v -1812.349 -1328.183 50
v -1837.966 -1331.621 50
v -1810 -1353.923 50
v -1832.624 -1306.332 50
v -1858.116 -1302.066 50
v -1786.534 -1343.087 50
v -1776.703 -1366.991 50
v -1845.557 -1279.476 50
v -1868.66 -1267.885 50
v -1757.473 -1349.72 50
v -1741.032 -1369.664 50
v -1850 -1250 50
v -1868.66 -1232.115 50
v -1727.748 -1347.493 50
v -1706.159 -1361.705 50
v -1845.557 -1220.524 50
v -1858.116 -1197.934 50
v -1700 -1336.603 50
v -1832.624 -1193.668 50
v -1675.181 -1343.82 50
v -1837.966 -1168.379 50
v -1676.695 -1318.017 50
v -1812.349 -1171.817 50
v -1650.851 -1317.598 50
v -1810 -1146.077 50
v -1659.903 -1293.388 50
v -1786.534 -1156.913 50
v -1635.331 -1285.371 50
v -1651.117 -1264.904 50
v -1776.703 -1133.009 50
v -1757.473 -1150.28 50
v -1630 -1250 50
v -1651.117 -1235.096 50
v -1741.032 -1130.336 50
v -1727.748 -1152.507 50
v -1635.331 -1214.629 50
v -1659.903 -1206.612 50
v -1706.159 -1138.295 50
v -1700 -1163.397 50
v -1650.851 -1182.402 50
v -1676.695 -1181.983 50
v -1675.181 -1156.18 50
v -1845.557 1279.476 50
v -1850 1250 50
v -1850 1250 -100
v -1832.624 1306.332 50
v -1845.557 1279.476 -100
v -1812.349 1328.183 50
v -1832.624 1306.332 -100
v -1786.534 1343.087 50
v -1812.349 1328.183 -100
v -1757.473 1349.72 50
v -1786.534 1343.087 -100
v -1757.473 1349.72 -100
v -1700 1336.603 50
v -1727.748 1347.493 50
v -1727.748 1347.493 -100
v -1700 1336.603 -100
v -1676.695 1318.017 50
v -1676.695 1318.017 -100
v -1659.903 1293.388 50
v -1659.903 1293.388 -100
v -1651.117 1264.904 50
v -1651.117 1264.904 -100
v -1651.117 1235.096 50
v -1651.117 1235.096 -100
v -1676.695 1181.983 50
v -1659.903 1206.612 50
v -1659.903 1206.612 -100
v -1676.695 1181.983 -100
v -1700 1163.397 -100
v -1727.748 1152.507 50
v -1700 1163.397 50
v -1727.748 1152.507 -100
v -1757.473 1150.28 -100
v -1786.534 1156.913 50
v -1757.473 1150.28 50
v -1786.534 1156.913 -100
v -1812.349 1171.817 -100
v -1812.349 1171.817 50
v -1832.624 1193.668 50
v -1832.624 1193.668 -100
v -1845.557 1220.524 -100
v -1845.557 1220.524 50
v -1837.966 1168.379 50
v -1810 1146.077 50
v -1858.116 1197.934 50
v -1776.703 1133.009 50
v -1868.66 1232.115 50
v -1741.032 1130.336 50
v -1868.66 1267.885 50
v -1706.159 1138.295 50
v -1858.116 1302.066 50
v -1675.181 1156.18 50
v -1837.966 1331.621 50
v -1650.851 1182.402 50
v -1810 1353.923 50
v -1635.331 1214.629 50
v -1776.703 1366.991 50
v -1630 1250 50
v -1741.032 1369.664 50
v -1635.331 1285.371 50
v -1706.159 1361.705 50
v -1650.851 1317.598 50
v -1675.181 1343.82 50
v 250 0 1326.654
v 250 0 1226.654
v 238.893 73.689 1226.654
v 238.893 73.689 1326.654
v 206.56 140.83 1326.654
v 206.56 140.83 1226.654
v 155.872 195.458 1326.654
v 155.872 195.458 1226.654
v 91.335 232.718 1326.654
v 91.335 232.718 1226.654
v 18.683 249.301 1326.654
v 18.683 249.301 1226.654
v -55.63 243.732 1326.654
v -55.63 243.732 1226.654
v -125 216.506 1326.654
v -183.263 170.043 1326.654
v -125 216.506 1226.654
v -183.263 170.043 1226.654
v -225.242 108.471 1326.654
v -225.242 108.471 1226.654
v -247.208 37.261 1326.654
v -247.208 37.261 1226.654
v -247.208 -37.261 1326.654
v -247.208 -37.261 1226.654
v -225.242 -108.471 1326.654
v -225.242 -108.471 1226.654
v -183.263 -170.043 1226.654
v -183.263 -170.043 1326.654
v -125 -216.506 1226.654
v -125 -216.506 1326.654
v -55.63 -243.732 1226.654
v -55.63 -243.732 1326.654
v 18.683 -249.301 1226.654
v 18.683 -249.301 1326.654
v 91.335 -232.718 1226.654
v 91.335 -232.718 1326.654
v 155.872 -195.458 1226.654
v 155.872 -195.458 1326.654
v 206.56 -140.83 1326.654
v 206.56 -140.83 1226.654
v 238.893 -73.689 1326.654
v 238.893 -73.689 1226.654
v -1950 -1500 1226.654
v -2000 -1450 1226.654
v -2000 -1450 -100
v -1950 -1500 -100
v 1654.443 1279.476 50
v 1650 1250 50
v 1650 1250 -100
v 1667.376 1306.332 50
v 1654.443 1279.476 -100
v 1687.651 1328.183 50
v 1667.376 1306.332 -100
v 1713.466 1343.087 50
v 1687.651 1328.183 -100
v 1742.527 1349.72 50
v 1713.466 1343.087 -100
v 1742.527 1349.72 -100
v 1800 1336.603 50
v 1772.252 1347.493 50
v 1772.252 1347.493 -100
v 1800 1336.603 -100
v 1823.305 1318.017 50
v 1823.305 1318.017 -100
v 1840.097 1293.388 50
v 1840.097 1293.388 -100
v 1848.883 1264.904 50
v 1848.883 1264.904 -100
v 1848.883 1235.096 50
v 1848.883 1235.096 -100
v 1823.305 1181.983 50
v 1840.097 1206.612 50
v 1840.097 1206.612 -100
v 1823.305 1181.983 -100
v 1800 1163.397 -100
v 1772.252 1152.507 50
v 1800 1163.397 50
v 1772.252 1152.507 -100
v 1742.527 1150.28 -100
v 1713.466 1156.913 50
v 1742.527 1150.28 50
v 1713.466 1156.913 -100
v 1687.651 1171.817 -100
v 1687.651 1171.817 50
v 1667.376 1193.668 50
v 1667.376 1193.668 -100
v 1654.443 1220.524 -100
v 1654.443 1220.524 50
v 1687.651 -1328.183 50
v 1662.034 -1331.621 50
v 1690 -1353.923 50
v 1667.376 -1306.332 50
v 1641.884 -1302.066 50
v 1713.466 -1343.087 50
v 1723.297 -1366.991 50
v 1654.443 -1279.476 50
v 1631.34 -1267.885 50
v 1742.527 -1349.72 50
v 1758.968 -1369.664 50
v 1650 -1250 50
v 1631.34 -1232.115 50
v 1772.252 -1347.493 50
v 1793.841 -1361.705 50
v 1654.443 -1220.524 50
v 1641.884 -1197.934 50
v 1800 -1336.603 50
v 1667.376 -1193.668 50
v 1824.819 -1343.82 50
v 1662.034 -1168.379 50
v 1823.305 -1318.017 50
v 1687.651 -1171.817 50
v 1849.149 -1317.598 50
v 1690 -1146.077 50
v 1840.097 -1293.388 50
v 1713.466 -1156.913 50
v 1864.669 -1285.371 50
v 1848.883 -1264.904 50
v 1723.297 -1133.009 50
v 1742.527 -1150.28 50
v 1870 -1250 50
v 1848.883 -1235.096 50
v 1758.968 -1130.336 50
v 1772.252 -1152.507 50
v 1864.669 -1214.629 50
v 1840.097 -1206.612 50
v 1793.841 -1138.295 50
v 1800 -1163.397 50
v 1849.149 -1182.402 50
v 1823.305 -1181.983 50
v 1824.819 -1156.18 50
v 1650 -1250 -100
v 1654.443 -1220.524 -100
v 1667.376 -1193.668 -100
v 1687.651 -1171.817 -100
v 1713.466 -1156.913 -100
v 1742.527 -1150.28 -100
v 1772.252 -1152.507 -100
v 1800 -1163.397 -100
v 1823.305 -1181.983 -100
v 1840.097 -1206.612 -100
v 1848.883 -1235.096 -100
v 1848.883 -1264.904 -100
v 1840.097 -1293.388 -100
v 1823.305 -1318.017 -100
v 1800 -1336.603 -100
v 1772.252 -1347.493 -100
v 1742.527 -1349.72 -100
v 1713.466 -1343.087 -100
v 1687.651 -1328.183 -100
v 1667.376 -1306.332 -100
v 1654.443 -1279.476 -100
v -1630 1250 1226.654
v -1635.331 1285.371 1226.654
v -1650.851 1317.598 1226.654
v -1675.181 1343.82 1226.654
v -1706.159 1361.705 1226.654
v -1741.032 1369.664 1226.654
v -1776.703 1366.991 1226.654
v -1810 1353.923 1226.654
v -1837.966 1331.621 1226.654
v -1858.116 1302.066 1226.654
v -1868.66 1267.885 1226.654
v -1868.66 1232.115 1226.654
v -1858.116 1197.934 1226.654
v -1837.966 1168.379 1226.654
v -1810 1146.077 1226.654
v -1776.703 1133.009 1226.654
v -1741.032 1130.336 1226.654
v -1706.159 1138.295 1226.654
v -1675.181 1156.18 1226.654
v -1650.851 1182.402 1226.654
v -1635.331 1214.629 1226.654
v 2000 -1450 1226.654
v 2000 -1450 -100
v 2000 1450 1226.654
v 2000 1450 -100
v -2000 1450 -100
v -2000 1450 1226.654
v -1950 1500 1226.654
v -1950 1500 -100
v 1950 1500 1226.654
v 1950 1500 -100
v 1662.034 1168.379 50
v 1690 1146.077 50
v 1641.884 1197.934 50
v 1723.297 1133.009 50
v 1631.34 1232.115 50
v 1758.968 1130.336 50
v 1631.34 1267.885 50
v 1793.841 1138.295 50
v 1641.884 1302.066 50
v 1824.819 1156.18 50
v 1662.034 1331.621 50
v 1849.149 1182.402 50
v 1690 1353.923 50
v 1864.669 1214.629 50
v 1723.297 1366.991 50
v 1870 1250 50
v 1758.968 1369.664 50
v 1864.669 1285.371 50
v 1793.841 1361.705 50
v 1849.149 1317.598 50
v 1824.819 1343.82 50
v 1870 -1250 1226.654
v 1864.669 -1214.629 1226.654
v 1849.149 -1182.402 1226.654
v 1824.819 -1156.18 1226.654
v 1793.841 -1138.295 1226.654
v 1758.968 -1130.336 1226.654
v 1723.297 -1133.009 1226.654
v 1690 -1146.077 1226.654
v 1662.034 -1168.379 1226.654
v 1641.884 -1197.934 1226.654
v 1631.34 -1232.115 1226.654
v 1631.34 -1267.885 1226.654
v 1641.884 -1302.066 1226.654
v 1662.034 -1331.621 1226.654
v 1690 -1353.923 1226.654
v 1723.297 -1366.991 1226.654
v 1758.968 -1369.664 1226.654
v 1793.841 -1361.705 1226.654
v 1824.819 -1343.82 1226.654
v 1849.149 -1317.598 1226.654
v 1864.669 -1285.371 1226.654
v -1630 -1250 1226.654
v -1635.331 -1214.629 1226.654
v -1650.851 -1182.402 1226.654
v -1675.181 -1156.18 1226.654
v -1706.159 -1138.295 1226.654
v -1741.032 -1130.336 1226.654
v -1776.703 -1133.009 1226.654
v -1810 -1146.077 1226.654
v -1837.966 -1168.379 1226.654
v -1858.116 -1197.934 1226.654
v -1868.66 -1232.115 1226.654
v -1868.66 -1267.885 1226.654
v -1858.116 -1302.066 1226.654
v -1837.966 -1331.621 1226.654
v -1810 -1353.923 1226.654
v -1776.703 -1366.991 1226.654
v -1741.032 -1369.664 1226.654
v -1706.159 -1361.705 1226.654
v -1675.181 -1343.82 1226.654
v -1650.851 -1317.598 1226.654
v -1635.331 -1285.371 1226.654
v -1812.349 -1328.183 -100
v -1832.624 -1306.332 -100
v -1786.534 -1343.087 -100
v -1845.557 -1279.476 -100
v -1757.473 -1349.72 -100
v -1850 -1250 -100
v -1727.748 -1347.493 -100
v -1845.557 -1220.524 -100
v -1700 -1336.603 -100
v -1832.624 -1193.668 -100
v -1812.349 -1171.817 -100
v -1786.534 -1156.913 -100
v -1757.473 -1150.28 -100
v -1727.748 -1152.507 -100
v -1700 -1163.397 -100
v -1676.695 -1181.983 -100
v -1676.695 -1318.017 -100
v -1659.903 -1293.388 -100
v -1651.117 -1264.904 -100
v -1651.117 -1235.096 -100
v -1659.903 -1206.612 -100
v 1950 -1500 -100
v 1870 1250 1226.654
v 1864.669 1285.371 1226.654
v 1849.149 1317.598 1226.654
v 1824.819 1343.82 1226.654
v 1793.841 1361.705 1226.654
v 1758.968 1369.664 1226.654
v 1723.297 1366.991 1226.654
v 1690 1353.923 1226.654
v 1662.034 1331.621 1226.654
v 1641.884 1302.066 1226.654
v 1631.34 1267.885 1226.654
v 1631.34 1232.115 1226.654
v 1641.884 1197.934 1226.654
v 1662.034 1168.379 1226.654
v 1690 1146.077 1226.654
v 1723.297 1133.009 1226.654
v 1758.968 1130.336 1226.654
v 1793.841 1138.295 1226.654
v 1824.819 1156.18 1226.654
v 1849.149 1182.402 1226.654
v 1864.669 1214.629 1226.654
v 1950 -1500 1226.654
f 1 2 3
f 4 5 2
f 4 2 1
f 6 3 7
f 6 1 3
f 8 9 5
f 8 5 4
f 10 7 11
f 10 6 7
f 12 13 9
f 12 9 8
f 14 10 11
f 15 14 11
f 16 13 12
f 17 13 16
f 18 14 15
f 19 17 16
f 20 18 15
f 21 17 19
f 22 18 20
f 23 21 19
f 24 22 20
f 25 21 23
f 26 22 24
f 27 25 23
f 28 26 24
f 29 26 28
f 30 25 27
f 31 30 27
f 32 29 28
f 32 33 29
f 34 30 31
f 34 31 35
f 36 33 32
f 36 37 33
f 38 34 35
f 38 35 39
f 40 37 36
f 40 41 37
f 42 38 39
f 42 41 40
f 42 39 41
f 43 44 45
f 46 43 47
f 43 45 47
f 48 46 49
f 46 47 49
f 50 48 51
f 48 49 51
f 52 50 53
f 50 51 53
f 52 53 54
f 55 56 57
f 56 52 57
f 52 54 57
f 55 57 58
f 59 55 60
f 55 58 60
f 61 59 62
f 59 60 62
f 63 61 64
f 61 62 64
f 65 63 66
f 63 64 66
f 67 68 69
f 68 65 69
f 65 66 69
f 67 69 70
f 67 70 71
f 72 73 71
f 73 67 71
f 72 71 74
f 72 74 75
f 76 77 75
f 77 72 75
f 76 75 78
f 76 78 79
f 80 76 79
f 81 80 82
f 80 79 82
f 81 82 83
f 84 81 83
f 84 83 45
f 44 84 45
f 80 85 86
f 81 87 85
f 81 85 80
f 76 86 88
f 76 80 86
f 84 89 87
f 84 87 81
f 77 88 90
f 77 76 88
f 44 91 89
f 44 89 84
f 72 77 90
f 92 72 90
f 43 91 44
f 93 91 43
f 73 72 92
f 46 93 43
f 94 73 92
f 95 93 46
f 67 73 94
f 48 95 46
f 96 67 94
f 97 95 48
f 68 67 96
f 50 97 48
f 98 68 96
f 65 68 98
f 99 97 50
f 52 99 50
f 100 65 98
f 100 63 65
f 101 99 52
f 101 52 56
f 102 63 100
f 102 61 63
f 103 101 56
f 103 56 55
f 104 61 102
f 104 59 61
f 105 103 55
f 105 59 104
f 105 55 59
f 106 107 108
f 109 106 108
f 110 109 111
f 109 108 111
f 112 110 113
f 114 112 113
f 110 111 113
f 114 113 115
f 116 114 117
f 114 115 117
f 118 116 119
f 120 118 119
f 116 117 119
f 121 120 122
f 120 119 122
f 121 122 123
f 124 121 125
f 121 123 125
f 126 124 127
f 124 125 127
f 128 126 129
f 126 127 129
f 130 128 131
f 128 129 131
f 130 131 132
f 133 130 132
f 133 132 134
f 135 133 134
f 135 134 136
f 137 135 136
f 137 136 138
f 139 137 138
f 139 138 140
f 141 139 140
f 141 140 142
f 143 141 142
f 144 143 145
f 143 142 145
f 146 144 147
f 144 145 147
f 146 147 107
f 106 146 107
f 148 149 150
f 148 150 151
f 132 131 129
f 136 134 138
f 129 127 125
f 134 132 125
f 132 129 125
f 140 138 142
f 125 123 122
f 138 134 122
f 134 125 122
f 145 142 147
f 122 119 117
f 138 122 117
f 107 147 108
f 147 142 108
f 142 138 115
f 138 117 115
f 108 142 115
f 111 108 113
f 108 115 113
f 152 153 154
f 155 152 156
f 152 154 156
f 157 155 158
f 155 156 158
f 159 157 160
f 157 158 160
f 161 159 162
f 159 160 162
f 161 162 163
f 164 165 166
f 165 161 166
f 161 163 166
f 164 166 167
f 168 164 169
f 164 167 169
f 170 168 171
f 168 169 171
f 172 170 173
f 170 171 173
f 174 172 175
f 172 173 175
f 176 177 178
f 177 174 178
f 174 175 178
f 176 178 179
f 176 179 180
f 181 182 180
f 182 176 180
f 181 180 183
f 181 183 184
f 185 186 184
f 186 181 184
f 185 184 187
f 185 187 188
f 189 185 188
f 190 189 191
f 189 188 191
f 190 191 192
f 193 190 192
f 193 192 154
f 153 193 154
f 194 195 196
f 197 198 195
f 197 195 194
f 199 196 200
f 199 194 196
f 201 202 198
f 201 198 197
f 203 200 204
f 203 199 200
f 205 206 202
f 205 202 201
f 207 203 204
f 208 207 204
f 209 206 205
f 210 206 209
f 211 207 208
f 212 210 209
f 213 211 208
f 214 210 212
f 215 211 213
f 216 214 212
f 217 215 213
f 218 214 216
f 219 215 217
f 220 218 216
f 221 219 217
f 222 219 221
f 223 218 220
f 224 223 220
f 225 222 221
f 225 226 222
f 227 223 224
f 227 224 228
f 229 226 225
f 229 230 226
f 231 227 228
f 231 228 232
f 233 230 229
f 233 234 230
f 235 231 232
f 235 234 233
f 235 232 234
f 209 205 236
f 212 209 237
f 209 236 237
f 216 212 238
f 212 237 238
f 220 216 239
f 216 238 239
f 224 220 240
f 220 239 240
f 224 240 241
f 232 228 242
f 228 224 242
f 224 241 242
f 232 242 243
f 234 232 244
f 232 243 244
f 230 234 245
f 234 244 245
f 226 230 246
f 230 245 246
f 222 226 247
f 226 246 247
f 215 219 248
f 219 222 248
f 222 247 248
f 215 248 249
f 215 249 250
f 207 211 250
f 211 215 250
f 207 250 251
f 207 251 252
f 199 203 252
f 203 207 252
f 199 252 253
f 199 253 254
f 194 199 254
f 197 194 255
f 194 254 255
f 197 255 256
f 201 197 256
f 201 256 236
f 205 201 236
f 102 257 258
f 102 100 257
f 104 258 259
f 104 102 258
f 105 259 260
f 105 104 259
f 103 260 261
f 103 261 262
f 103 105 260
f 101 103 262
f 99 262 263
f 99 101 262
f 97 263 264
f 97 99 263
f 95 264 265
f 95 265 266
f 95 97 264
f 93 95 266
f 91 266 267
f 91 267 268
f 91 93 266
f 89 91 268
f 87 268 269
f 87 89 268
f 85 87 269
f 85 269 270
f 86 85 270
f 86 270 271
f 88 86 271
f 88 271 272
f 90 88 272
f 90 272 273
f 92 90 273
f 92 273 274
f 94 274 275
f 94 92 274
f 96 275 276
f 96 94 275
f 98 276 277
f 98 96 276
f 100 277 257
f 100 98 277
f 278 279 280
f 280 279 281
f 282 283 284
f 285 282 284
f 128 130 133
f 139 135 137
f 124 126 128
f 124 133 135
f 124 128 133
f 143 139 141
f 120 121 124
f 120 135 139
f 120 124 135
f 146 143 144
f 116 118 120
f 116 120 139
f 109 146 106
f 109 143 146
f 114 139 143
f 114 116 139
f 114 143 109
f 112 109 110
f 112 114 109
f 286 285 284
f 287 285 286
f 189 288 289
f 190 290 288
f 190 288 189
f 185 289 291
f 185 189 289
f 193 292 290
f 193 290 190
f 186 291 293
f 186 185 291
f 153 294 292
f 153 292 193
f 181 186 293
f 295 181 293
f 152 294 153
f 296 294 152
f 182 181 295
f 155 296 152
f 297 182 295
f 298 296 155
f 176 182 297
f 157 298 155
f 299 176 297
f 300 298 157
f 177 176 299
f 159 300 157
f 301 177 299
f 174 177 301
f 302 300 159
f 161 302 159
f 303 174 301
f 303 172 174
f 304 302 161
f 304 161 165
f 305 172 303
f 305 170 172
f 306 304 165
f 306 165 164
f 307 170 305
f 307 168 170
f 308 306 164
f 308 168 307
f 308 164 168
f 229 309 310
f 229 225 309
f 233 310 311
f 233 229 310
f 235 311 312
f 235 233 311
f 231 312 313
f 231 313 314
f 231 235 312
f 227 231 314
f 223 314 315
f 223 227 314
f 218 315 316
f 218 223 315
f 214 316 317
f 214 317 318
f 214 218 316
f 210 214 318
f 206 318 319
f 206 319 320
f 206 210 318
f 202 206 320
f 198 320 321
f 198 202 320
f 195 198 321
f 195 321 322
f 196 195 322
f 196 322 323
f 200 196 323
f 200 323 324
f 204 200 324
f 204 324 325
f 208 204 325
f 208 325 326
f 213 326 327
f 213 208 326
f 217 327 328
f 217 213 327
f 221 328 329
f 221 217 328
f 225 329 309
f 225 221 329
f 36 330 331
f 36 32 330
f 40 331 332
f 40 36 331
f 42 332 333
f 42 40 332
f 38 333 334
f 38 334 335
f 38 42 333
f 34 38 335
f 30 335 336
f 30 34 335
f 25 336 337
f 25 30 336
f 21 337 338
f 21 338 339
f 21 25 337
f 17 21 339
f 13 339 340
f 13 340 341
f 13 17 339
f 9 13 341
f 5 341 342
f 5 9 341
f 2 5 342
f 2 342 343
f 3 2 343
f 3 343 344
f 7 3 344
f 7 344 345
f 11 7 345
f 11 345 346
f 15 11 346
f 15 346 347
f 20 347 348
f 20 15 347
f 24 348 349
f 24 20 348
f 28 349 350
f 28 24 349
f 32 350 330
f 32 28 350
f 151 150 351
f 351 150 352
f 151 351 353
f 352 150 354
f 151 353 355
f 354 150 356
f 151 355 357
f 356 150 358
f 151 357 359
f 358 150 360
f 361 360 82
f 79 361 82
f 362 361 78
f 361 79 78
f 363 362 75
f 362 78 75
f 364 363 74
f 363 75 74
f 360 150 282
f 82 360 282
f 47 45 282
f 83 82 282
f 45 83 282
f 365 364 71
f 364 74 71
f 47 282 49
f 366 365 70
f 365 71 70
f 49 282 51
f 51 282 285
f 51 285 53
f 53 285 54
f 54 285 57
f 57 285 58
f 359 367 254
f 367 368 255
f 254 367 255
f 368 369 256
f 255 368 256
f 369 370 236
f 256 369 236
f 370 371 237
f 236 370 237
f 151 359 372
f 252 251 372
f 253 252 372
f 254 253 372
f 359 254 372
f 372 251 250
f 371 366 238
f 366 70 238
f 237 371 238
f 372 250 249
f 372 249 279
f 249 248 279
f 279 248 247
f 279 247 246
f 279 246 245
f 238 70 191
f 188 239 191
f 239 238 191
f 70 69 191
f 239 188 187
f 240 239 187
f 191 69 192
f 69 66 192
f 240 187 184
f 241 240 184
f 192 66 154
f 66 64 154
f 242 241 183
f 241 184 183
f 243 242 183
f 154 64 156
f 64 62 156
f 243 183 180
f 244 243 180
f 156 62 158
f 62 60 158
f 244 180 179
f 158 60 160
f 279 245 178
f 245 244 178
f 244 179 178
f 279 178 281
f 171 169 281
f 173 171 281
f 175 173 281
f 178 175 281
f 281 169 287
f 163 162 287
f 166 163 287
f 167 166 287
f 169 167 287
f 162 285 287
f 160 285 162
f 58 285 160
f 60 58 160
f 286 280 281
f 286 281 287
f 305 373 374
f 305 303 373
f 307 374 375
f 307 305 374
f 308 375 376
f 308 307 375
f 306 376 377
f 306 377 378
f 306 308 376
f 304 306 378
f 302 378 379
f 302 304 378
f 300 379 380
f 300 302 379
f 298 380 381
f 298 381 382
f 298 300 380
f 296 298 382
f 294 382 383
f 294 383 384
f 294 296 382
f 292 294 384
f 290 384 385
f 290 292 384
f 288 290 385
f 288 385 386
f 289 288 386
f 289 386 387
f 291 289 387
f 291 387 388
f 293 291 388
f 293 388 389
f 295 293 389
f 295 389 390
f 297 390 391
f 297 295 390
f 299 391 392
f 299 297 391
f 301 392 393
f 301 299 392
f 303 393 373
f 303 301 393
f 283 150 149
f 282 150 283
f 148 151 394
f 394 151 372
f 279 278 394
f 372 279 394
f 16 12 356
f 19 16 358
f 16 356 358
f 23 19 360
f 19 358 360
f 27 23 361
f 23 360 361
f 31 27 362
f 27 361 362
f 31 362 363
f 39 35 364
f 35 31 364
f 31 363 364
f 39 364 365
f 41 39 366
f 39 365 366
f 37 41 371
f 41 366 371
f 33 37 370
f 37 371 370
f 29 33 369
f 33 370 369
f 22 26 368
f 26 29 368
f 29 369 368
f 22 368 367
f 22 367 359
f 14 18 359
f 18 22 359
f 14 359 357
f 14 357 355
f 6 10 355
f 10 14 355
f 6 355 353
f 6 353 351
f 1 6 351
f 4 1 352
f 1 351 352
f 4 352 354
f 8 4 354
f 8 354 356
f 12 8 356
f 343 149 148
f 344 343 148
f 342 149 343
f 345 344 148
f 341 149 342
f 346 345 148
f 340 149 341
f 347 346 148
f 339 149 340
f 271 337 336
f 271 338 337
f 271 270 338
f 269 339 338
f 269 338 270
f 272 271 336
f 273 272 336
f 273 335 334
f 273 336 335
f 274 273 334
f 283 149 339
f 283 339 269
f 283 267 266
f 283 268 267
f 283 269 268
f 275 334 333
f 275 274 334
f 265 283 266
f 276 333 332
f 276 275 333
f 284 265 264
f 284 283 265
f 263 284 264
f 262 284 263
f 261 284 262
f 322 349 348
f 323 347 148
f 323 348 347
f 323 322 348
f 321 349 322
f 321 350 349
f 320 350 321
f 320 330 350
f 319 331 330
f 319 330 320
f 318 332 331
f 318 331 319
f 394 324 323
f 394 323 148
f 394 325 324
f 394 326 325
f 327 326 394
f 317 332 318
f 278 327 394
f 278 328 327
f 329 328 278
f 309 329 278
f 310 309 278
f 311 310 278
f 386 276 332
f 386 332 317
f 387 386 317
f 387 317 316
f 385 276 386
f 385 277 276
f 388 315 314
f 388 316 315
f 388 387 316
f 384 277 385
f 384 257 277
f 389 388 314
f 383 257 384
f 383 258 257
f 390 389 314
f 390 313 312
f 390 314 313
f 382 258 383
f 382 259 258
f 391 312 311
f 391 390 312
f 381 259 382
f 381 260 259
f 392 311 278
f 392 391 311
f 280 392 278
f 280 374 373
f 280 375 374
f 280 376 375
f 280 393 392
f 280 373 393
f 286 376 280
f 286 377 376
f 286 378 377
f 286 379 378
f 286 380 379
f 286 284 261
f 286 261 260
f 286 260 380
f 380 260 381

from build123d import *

# Parameters (mm, degrees)
F0_W      = 4000
F0_H      = 3000
F1_DEPTH  = 100
F2_SIZE   = 50
F4_D      = 200
F5_R      = 120
F5_R_2    = 100
F6_DEPTH  = 50
F7_DEPTH  = 1126.6541127115
F9_R      = 250
F10_DEPTH = 100


with BuildPart() as f1:
    # F0 (on Top) → F1 (new body, symmetric)
    with BuildSketch(Plane.XY):
        Rectangle(F0_W, F0_H)
    extrude(amount=F1_DEPTH, both=True)

    # F2
    f2_edges = [f1.edges().sort_by_distance(p)[0] for p in [
        (-2000, -1500, 0),
        (2000, 1500, 0),
        (2000, -1500, 0),
        (-2000, 1500, 0),
    ]]
    chamfer(f2_edges, length=F2_SIZE)

    # F4 (through all)
    with Locations(Plane.XY.offset(100)):
        with Locations((-1750, 1250), (1750, 1250), (-1750, -1250), (1750, -1250)):
            Hole(F4_D / 2)

    # F5 (on face) → F6 (cut)
    with BuildSketch(Plane.XY.offset(100)):
        with Locations((-1750, -1250)):
            Circle(F5_R)
        with Locations((-1750, -1250)):
            Circle(F5_R_2, mode=Mode.SUBTRACT)
        with Locations((-1750, 1250)):
            Circle(F5_R)
        with Locations((-1750, 1250)):
            Circle(F5_R_2, mode=Mode.SUBTRACT)
        with Locations((1750, 1250)):
            Circle(F5_R)
        with Locations((1750, 1250)):
            Circle(F5_R_2, mode=Mode.SUBTRACT)
        with Locations((1750, -1250)):
            Circle(F5_R)
        with Locations((1750, -1250)):
            Circle(F5_R_2, mode=Mode.SUBTRACT)
    extrude(amount=-F6_DEPTH, mode=Mode.SUBTRACT)

    # F7 (add): a face of the model
    f7_faces = [f1.faces().sort_by_distance(p)[0] for p in [
        (0, 0, 100),
    ]]
    extrude(f7_faces, amount=F7_DEPTH)


with BuildPart() as f10:
    # F9 (on face) → F10 (new body)
    with BuildSketch(Plane.XY.offset(1226.6541127115)):
        Circle(F9_R)
    extrude(amount=F10_DEPTH)


solid = Compound([f1.part, f10.part])
